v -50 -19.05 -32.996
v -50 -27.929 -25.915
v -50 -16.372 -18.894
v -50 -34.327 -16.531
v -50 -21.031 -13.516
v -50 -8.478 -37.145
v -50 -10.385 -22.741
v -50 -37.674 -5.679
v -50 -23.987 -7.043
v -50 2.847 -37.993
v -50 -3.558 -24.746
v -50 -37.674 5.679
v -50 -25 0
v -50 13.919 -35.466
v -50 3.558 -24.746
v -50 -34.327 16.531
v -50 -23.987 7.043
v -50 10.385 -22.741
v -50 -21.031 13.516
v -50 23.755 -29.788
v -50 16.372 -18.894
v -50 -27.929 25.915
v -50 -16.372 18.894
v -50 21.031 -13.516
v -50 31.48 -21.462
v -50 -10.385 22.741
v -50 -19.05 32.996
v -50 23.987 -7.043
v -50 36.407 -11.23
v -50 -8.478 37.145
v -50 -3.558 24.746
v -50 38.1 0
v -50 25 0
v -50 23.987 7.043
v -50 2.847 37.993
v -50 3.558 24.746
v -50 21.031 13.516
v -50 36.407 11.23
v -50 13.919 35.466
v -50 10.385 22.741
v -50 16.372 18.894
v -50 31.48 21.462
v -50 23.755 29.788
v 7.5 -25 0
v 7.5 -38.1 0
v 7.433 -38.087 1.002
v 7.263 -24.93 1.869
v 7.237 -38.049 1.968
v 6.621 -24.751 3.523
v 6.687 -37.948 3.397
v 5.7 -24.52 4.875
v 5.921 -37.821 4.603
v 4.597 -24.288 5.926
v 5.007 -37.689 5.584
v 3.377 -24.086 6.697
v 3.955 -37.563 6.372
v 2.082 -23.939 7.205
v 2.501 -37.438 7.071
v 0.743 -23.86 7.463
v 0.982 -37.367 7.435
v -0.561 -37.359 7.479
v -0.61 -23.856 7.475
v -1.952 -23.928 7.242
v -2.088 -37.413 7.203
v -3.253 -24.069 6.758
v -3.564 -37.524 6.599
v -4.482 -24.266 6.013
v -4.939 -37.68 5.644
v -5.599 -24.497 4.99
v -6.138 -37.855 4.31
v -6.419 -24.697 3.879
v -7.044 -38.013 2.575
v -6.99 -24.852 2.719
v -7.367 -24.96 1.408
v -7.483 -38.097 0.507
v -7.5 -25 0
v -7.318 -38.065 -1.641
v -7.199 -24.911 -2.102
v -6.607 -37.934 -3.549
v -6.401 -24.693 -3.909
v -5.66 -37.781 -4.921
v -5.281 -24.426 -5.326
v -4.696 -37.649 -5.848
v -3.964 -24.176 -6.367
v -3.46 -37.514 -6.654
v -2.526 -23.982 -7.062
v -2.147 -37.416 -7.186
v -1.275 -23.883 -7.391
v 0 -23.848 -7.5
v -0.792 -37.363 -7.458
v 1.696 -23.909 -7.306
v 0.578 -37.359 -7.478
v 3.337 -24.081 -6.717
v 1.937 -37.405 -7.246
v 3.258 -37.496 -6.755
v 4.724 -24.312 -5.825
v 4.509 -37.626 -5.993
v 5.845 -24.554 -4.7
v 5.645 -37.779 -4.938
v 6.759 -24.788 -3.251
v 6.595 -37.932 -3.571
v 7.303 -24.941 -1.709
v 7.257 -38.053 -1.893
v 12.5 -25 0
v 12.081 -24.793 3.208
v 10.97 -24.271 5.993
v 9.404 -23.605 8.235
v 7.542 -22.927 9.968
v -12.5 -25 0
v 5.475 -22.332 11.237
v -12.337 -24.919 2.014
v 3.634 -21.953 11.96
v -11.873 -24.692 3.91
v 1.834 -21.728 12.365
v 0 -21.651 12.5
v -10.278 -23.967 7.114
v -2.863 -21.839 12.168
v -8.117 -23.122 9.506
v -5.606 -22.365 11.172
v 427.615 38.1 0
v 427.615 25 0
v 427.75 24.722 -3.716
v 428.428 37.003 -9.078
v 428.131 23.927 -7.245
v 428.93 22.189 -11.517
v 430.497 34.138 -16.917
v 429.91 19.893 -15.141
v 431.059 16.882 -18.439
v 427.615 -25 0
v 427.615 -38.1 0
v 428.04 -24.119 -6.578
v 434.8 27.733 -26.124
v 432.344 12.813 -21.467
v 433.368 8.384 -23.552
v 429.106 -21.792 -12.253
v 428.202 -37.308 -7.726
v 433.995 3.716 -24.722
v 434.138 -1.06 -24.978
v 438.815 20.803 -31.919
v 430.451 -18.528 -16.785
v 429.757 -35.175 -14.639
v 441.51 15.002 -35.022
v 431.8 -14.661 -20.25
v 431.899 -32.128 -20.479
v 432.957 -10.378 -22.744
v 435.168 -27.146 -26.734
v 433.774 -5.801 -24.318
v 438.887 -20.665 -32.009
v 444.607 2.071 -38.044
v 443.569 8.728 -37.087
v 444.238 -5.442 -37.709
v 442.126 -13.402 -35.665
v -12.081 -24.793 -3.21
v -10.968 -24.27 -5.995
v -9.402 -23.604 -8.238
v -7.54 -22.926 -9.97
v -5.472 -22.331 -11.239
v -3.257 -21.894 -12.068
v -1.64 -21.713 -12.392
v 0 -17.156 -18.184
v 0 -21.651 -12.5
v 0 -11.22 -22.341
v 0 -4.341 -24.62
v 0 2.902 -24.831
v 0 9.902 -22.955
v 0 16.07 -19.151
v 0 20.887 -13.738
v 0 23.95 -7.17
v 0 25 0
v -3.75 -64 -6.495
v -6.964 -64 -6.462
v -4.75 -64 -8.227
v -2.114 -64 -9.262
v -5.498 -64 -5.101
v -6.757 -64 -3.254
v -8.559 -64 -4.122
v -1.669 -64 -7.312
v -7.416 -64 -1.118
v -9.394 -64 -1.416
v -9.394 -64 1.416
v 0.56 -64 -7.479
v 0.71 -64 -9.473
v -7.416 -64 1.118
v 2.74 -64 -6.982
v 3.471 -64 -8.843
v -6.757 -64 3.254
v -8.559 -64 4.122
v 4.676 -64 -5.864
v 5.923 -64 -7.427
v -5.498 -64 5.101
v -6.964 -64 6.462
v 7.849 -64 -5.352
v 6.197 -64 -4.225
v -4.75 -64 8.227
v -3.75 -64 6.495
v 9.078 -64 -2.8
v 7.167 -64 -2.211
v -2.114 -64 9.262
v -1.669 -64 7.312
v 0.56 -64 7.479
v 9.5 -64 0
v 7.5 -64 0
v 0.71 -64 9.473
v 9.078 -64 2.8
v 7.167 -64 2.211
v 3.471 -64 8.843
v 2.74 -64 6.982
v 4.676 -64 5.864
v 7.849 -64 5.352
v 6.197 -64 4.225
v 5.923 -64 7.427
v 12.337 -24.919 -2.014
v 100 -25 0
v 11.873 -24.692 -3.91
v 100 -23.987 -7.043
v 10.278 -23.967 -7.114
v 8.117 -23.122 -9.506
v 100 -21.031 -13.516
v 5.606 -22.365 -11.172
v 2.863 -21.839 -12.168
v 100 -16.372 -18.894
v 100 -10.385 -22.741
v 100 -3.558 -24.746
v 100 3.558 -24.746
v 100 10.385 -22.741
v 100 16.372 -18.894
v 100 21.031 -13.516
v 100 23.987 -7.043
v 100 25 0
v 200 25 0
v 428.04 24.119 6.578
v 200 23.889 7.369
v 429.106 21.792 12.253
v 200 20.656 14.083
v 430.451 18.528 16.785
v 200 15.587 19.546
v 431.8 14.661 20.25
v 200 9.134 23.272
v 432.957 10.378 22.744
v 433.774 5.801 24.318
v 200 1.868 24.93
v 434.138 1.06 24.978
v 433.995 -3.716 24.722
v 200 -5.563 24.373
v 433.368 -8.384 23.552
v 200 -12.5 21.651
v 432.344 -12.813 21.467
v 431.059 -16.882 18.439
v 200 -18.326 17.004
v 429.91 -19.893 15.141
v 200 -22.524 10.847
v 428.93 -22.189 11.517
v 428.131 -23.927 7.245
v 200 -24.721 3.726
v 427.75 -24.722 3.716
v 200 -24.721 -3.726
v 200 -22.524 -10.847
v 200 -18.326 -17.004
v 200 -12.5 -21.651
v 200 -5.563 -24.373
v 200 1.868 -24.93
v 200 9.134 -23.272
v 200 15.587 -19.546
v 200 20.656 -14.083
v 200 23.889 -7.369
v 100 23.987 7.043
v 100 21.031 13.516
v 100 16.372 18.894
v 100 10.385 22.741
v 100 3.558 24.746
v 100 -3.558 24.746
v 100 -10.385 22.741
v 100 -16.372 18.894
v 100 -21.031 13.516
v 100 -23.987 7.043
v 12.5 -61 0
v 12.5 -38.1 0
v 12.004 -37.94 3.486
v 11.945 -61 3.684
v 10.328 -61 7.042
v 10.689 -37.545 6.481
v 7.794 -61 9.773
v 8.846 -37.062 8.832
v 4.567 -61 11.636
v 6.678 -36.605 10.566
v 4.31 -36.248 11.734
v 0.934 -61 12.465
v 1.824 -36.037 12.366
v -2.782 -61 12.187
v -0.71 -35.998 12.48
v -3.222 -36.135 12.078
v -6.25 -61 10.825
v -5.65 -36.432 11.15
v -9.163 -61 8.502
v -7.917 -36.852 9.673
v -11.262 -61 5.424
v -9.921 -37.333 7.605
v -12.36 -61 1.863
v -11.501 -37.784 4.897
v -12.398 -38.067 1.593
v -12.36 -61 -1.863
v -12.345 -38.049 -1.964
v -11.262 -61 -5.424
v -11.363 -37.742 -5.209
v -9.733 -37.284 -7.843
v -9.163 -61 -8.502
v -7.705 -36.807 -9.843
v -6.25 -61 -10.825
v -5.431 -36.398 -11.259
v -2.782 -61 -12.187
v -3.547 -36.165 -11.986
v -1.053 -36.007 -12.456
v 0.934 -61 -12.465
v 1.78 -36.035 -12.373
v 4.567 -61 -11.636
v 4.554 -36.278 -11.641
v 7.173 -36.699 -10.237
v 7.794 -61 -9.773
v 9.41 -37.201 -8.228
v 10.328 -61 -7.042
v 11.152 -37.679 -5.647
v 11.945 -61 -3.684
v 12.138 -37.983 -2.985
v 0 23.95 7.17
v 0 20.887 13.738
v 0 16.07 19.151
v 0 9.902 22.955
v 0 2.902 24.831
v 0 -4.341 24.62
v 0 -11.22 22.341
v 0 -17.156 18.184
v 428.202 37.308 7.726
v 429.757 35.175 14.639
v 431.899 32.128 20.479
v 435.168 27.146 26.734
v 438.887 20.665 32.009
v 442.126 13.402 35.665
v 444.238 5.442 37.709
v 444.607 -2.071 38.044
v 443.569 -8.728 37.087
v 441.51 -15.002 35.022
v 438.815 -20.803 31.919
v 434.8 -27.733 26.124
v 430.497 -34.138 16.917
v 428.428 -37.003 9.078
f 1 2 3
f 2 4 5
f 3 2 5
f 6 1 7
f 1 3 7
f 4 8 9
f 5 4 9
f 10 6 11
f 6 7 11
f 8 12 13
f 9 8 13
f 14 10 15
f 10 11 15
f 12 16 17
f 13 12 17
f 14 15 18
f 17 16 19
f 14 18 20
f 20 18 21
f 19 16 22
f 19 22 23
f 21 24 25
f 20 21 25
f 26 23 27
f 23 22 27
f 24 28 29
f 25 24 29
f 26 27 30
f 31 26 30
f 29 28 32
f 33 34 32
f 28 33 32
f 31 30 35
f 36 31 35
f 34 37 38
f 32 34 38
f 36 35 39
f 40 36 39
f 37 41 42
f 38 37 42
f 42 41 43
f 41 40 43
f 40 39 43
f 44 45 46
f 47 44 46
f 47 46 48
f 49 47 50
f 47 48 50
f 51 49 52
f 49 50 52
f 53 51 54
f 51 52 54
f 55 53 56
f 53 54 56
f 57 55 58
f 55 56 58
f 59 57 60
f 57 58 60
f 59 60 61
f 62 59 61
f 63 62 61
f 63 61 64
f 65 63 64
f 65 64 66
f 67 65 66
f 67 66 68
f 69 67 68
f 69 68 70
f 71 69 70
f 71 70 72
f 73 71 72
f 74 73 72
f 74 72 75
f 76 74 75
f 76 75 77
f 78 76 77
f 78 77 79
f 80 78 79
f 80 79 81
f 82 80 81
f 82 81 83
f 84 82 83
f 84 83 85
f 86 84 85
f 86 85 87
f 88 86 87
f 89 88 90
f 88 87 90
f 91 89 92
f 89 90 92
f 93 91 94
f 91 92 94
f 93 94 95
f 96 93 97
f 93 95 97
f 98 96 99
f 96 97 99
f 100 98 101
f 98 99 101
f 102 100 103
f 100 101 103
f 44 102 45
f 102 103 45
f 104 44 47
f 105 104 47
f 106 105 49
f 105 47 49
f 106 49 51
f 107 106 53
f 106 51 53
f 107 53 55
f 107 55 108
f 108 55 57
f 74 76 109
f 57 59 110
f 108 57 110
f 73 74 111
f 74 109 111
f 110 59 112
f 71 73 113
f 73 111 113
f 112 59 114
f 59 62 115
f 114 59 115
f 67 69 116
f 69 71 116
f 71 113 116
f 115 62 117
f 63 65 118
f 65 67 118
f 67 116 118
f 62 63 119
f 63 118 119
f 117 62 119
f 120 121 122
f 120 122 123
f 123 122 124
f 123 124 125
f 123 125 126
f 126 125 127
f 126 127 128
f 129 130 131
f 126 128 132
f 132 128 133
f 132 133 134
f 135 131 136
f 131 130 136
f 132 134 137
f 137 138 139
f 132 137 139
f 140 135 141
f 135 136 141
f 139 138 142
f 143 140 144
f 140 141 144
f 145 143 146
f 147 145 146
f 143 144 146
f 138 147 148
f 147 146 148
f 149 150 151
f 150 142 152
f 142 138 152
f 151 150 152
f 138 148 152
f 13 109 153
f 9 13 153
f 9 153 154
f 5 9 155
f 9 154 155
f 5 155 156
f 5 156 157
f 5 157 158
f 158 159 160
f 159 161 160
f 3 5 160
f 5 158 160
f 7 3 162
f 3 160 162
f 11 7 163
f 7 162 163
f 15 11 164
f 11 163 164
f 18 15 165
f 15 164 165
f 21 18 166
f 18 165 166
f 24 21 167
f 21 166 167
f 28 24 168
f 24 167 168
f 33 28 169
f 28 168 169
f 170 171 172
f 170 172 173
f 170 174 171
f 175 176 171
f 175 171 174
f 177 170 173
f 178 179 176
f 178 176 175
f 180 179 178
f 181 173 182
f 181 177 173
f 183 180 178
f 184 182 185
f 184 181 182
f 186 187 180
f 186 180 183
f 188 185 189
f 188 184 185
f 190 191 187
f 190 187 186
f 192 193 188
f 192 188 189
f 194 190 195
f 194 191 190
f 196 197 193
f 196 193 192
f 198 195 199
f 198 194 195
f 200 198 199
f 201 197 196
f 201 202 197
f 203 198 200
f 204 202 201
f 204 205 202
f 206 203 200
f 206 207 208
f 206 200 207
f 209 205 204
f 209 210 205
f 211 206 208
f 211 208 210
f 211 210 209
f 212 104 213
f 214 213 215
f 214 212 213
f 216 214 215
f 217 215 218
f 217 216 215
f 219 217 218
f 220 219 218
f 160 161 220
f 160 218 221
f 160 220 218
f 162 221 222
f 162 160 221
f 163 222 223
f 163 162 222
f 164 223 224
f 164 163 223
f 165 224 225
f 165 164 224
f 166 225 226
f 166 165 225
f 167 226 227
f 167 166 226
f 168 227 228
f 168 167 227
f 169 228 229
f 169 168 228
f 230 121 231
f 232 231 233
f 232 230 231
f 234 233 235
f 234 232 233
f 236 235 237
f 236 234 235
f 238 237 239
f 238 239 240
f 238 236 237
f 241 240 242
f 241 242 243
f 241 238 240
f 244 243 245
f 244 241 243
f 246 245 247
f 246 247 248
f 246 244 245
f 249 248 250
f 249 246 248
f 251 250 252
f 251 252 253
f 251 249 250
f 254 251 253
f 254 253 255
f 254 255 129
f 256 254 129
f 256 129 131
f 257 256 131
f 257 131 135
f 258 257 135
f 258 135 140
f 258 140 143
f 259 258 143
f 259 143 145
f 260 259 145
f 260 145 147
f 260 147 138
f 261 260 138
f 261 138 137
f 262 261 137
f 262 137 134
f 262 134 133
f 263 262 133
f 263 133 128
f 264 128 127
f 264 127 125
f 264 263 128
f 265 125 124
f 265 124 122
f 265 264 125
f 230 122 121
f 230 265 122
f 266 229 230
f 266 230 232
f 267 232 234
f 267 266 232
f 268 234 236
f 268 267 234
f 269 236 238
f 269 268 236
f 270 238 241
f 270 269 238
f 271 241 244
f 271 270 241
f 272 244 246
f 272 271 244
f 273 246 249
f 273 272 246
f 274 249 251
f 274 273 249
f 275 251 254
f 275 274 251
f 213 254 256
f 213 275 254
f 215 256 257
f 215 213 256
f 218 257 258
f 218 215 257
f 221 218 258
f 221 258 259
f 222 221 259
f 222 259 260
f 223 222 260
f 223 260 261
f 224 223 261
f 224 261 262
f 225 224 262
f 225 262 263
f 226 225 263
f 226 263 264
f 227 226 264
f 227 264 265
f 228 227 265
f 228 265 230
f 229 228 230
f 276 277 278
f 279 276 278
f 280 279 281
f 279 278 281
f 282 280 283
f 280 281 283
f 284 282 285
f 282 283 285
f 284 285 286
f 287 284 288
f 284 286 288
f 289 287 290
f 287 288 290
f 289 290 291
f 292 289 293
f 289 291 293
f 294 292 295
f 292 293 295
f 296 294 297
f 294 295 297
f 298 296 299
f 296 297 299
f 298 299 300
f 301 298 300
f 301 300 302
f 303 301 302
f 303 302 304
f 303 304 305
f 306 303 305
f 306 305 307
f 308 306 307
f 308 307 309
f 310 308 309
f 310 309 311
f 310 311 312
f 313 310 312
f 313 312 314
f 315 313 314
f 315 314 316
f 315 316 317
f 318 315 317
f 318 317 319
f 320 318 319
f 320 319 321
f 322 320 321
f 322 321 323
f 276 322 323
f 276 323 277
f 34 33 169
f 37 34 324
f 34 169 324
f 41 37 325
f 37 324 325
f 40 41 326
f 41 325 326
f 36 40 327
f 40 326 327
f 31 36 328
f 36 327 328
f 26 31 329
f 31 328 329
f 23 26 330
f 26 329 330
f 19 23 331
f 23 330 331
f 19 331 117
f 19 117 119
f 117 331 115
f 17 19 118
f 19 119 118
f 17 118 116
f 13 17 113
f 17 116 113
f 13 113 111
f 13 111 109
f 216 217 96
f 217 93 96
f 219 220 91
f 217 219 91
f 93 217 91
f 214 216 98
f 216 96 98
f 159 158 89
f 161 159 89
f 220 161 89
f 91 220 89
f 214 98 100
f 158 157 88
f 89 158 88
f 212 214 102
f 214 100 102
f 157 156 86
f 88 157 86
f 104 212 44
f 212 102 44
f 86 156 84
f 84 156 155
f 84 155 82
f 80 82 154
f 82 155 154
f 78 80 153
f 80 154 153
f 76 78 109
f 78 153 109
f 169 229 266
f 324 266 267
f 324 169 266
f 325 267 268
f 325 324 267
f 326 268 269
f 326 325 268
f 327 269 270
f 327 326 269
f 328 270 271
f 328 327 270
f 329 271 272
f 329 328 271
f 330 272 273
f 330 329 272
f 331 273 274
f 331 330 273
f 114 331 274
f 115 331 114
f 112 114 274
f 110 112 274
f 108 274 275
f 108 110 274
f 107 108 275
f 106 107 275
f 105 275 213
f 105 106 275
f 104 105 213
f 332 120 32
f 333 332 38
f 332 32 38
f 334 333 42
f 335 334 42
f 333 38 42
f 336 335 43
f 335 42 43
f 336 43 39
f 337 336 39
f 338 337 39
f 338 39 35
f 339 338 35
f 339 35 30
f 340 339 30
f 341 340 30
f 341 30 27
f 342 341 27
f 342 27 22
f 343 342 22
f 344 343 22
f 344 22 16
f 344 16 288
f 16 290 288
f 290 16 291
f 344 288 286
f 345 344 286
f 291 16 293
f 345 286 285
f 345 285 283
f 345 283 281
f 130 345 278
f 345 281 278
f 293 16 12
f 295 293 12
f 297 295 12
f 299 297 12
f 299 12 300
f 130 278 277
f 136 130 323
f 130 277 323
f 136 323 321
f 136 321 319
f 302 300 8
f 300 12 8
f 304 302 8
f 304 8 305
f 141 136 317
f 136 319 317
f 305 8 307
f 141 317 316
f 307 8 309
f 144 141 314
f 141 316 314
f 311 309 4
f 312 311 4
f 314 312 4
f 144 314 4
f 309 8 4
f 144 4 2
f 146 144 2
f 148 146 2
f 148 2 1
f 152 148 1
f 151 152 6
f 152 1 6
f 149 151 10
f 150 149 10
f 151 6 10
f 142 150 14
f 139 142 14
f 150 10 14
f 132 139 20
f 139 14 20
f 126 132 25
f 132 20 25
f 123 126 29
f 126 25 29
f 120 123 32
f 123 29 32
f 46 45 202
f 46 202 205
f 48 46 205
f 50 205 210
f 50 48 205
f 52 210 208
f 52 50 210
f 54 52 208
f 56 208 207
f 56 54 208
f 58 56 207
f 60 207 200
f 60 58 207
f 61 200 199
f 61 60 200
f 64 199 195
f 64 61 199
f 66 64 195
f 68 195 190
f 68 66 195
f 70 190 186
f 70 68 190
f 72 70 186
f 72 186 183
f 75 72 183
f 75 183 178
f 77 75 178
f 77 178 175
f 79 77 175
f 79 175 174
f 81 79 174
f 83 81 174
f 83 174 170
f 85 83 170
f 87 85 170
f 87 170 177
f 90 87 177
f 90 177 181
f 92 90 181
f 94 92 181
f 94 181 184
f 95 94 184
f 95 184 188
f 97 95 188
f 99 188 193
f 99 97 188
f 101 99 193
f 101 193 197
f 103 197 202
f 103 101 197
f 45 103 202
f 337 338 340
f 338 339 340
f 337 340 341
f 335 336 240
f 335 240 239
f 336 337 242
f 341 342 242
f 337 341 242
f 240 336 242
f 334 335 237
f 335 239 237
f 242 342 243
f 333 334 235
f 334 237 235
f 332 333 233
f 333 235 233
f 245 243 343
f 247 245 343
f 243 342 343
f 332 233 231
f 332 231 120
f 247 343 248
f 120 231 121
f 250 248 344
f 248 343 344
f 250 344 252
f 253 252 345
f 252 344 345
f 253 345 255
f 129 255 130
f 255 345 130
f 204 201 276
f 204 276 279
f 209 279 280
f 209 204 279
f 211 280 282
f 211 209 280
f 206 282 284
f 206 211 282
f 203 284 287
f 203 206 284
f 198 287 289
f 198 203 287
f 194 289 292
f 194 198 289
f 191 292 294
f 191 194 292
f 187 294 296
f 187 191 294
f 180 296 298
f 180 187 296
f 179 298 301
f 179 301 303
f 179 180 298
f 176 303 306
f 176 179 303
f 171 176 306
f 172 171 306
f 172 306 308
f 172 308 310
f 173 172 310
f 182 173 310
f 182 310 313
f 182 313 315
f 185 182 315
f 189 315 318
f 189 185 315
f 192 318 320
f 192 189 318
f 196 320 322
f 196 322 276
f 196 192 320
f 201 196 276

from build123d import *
from build123d import SkipClean  # not in build123d's __all__

# Parameters (mm, degrees)
F0_R      = 12.5
F0_R_2    = 7.5
F1_DEPTH  = 64
F2_R      = 38.1
F2_R_2    = 25
F3_DEPTH  = 100
F4_DEPTH  = 50
F5_SIZE   = 3
F6_R      = 25
F7_DEPTH  = 200
F8_R      = 7.5
F9_DEPTH  = 50
F10_DEPTH = 100
F11_R     = 7.5
F12_DEPTH = 50
F13_DEPTH = 250


with BuildPart() as f1:
    # F0 (on Front) → F1 (new body)
    with BuildSketch(Plane.XZ):
        Circle(F0_R)
        Circle(F0_R_2, mode=Mode.SUBTRACT)
    extrude(amount=F1_DEPTH)

    # F2 (on Right) → F3 (join)
    with BuildSketch(Plane.YZ):
        Circle(F2_R)
        Circle(F2_R_2, mode=Mode.SUBTRACT)
    extrude(amount=F3_DEPTH)

    # F2 (on Right) → F4 (join)
    with BuildSketch(Plane.YZ):
        Circle(F2_R)
        Circle(F2_R_2, mode=Mode.SUBTRACT)
    extrude(amount=-F4_DEPTH)

    # F5
    f5_edges = [f1.edges().sort_by_distance(p)[0] for p in [
        (-12.5, -64, 0),
    ]]
    chamfer(f5_edges, length=F5_SIZE)

    # F6 (on face) → F7 (cut)
    with BuildSketch(Plane(origin=(-50, 0, 0), x_dir=(0, -1, 0), z_dir=(-1, 0, 0))):
        Circle(F6_R)
    extrude(amount=-F7_DEPTH, mode=Mode.SUBTRACT)

    # F8 (on face) → F9 (cut)
    with BuildSketch(Plane.XZ.offset(64)):
        Circle(F8_R)
    extrude(amount=-F9_DEPTH, mode=Mode.SUBTRACT)

    # F10 (add): a face of the model
    f10_faces = [f1.faces().sort_by_distance(p)[0] for p in [
        (100, -37.0223692655, 0),
    ]]
    with SkipClean():  # cleaning this boolean's faces spoils the solid; the shape is the same uncleaned
        extrude(f10_faces, amount=F10_DEPTH)

    # F11 (on face) → F12 (cut)
    with BuildSketch(Plane.XZ.offset(64)):
        Circle(F11_R)
    with SkipClean():  # cleaning this boolean's faces spoils the solid; the shape is the same uncleaned
        extrude(amount=-F12_DEPTH, mode=Mode.SUBTRACT)

    # F13 (add): a face of the model
    f13_faces = [f1.faces().sort_by_distance(p)[0] for p in [
        (200, -37.0223692655, 0),
    ]]
    extrude(f13_faces, amount=F13_DEPTH)

    # F14 (on Top) → F15 (revolve, cut)
    with BuildSketch(Plane.XY):
        Polygon((455.1408666709, 52.4849742776), (427.6145875454, 51.9348941743), (427.6145875454, -50.6588555872), (455.1408666709, -51.4342445287), align=None)
    with SkipClean():  # cleaning this boolean's faces spoils the solid; the shape is the same uncleaned
        revolve(axis=Axis((478.6976158619, 0.4289562068, 0), (0, -1, 0)), mode=Mode.SUBTRACT)


solid = f1.part
